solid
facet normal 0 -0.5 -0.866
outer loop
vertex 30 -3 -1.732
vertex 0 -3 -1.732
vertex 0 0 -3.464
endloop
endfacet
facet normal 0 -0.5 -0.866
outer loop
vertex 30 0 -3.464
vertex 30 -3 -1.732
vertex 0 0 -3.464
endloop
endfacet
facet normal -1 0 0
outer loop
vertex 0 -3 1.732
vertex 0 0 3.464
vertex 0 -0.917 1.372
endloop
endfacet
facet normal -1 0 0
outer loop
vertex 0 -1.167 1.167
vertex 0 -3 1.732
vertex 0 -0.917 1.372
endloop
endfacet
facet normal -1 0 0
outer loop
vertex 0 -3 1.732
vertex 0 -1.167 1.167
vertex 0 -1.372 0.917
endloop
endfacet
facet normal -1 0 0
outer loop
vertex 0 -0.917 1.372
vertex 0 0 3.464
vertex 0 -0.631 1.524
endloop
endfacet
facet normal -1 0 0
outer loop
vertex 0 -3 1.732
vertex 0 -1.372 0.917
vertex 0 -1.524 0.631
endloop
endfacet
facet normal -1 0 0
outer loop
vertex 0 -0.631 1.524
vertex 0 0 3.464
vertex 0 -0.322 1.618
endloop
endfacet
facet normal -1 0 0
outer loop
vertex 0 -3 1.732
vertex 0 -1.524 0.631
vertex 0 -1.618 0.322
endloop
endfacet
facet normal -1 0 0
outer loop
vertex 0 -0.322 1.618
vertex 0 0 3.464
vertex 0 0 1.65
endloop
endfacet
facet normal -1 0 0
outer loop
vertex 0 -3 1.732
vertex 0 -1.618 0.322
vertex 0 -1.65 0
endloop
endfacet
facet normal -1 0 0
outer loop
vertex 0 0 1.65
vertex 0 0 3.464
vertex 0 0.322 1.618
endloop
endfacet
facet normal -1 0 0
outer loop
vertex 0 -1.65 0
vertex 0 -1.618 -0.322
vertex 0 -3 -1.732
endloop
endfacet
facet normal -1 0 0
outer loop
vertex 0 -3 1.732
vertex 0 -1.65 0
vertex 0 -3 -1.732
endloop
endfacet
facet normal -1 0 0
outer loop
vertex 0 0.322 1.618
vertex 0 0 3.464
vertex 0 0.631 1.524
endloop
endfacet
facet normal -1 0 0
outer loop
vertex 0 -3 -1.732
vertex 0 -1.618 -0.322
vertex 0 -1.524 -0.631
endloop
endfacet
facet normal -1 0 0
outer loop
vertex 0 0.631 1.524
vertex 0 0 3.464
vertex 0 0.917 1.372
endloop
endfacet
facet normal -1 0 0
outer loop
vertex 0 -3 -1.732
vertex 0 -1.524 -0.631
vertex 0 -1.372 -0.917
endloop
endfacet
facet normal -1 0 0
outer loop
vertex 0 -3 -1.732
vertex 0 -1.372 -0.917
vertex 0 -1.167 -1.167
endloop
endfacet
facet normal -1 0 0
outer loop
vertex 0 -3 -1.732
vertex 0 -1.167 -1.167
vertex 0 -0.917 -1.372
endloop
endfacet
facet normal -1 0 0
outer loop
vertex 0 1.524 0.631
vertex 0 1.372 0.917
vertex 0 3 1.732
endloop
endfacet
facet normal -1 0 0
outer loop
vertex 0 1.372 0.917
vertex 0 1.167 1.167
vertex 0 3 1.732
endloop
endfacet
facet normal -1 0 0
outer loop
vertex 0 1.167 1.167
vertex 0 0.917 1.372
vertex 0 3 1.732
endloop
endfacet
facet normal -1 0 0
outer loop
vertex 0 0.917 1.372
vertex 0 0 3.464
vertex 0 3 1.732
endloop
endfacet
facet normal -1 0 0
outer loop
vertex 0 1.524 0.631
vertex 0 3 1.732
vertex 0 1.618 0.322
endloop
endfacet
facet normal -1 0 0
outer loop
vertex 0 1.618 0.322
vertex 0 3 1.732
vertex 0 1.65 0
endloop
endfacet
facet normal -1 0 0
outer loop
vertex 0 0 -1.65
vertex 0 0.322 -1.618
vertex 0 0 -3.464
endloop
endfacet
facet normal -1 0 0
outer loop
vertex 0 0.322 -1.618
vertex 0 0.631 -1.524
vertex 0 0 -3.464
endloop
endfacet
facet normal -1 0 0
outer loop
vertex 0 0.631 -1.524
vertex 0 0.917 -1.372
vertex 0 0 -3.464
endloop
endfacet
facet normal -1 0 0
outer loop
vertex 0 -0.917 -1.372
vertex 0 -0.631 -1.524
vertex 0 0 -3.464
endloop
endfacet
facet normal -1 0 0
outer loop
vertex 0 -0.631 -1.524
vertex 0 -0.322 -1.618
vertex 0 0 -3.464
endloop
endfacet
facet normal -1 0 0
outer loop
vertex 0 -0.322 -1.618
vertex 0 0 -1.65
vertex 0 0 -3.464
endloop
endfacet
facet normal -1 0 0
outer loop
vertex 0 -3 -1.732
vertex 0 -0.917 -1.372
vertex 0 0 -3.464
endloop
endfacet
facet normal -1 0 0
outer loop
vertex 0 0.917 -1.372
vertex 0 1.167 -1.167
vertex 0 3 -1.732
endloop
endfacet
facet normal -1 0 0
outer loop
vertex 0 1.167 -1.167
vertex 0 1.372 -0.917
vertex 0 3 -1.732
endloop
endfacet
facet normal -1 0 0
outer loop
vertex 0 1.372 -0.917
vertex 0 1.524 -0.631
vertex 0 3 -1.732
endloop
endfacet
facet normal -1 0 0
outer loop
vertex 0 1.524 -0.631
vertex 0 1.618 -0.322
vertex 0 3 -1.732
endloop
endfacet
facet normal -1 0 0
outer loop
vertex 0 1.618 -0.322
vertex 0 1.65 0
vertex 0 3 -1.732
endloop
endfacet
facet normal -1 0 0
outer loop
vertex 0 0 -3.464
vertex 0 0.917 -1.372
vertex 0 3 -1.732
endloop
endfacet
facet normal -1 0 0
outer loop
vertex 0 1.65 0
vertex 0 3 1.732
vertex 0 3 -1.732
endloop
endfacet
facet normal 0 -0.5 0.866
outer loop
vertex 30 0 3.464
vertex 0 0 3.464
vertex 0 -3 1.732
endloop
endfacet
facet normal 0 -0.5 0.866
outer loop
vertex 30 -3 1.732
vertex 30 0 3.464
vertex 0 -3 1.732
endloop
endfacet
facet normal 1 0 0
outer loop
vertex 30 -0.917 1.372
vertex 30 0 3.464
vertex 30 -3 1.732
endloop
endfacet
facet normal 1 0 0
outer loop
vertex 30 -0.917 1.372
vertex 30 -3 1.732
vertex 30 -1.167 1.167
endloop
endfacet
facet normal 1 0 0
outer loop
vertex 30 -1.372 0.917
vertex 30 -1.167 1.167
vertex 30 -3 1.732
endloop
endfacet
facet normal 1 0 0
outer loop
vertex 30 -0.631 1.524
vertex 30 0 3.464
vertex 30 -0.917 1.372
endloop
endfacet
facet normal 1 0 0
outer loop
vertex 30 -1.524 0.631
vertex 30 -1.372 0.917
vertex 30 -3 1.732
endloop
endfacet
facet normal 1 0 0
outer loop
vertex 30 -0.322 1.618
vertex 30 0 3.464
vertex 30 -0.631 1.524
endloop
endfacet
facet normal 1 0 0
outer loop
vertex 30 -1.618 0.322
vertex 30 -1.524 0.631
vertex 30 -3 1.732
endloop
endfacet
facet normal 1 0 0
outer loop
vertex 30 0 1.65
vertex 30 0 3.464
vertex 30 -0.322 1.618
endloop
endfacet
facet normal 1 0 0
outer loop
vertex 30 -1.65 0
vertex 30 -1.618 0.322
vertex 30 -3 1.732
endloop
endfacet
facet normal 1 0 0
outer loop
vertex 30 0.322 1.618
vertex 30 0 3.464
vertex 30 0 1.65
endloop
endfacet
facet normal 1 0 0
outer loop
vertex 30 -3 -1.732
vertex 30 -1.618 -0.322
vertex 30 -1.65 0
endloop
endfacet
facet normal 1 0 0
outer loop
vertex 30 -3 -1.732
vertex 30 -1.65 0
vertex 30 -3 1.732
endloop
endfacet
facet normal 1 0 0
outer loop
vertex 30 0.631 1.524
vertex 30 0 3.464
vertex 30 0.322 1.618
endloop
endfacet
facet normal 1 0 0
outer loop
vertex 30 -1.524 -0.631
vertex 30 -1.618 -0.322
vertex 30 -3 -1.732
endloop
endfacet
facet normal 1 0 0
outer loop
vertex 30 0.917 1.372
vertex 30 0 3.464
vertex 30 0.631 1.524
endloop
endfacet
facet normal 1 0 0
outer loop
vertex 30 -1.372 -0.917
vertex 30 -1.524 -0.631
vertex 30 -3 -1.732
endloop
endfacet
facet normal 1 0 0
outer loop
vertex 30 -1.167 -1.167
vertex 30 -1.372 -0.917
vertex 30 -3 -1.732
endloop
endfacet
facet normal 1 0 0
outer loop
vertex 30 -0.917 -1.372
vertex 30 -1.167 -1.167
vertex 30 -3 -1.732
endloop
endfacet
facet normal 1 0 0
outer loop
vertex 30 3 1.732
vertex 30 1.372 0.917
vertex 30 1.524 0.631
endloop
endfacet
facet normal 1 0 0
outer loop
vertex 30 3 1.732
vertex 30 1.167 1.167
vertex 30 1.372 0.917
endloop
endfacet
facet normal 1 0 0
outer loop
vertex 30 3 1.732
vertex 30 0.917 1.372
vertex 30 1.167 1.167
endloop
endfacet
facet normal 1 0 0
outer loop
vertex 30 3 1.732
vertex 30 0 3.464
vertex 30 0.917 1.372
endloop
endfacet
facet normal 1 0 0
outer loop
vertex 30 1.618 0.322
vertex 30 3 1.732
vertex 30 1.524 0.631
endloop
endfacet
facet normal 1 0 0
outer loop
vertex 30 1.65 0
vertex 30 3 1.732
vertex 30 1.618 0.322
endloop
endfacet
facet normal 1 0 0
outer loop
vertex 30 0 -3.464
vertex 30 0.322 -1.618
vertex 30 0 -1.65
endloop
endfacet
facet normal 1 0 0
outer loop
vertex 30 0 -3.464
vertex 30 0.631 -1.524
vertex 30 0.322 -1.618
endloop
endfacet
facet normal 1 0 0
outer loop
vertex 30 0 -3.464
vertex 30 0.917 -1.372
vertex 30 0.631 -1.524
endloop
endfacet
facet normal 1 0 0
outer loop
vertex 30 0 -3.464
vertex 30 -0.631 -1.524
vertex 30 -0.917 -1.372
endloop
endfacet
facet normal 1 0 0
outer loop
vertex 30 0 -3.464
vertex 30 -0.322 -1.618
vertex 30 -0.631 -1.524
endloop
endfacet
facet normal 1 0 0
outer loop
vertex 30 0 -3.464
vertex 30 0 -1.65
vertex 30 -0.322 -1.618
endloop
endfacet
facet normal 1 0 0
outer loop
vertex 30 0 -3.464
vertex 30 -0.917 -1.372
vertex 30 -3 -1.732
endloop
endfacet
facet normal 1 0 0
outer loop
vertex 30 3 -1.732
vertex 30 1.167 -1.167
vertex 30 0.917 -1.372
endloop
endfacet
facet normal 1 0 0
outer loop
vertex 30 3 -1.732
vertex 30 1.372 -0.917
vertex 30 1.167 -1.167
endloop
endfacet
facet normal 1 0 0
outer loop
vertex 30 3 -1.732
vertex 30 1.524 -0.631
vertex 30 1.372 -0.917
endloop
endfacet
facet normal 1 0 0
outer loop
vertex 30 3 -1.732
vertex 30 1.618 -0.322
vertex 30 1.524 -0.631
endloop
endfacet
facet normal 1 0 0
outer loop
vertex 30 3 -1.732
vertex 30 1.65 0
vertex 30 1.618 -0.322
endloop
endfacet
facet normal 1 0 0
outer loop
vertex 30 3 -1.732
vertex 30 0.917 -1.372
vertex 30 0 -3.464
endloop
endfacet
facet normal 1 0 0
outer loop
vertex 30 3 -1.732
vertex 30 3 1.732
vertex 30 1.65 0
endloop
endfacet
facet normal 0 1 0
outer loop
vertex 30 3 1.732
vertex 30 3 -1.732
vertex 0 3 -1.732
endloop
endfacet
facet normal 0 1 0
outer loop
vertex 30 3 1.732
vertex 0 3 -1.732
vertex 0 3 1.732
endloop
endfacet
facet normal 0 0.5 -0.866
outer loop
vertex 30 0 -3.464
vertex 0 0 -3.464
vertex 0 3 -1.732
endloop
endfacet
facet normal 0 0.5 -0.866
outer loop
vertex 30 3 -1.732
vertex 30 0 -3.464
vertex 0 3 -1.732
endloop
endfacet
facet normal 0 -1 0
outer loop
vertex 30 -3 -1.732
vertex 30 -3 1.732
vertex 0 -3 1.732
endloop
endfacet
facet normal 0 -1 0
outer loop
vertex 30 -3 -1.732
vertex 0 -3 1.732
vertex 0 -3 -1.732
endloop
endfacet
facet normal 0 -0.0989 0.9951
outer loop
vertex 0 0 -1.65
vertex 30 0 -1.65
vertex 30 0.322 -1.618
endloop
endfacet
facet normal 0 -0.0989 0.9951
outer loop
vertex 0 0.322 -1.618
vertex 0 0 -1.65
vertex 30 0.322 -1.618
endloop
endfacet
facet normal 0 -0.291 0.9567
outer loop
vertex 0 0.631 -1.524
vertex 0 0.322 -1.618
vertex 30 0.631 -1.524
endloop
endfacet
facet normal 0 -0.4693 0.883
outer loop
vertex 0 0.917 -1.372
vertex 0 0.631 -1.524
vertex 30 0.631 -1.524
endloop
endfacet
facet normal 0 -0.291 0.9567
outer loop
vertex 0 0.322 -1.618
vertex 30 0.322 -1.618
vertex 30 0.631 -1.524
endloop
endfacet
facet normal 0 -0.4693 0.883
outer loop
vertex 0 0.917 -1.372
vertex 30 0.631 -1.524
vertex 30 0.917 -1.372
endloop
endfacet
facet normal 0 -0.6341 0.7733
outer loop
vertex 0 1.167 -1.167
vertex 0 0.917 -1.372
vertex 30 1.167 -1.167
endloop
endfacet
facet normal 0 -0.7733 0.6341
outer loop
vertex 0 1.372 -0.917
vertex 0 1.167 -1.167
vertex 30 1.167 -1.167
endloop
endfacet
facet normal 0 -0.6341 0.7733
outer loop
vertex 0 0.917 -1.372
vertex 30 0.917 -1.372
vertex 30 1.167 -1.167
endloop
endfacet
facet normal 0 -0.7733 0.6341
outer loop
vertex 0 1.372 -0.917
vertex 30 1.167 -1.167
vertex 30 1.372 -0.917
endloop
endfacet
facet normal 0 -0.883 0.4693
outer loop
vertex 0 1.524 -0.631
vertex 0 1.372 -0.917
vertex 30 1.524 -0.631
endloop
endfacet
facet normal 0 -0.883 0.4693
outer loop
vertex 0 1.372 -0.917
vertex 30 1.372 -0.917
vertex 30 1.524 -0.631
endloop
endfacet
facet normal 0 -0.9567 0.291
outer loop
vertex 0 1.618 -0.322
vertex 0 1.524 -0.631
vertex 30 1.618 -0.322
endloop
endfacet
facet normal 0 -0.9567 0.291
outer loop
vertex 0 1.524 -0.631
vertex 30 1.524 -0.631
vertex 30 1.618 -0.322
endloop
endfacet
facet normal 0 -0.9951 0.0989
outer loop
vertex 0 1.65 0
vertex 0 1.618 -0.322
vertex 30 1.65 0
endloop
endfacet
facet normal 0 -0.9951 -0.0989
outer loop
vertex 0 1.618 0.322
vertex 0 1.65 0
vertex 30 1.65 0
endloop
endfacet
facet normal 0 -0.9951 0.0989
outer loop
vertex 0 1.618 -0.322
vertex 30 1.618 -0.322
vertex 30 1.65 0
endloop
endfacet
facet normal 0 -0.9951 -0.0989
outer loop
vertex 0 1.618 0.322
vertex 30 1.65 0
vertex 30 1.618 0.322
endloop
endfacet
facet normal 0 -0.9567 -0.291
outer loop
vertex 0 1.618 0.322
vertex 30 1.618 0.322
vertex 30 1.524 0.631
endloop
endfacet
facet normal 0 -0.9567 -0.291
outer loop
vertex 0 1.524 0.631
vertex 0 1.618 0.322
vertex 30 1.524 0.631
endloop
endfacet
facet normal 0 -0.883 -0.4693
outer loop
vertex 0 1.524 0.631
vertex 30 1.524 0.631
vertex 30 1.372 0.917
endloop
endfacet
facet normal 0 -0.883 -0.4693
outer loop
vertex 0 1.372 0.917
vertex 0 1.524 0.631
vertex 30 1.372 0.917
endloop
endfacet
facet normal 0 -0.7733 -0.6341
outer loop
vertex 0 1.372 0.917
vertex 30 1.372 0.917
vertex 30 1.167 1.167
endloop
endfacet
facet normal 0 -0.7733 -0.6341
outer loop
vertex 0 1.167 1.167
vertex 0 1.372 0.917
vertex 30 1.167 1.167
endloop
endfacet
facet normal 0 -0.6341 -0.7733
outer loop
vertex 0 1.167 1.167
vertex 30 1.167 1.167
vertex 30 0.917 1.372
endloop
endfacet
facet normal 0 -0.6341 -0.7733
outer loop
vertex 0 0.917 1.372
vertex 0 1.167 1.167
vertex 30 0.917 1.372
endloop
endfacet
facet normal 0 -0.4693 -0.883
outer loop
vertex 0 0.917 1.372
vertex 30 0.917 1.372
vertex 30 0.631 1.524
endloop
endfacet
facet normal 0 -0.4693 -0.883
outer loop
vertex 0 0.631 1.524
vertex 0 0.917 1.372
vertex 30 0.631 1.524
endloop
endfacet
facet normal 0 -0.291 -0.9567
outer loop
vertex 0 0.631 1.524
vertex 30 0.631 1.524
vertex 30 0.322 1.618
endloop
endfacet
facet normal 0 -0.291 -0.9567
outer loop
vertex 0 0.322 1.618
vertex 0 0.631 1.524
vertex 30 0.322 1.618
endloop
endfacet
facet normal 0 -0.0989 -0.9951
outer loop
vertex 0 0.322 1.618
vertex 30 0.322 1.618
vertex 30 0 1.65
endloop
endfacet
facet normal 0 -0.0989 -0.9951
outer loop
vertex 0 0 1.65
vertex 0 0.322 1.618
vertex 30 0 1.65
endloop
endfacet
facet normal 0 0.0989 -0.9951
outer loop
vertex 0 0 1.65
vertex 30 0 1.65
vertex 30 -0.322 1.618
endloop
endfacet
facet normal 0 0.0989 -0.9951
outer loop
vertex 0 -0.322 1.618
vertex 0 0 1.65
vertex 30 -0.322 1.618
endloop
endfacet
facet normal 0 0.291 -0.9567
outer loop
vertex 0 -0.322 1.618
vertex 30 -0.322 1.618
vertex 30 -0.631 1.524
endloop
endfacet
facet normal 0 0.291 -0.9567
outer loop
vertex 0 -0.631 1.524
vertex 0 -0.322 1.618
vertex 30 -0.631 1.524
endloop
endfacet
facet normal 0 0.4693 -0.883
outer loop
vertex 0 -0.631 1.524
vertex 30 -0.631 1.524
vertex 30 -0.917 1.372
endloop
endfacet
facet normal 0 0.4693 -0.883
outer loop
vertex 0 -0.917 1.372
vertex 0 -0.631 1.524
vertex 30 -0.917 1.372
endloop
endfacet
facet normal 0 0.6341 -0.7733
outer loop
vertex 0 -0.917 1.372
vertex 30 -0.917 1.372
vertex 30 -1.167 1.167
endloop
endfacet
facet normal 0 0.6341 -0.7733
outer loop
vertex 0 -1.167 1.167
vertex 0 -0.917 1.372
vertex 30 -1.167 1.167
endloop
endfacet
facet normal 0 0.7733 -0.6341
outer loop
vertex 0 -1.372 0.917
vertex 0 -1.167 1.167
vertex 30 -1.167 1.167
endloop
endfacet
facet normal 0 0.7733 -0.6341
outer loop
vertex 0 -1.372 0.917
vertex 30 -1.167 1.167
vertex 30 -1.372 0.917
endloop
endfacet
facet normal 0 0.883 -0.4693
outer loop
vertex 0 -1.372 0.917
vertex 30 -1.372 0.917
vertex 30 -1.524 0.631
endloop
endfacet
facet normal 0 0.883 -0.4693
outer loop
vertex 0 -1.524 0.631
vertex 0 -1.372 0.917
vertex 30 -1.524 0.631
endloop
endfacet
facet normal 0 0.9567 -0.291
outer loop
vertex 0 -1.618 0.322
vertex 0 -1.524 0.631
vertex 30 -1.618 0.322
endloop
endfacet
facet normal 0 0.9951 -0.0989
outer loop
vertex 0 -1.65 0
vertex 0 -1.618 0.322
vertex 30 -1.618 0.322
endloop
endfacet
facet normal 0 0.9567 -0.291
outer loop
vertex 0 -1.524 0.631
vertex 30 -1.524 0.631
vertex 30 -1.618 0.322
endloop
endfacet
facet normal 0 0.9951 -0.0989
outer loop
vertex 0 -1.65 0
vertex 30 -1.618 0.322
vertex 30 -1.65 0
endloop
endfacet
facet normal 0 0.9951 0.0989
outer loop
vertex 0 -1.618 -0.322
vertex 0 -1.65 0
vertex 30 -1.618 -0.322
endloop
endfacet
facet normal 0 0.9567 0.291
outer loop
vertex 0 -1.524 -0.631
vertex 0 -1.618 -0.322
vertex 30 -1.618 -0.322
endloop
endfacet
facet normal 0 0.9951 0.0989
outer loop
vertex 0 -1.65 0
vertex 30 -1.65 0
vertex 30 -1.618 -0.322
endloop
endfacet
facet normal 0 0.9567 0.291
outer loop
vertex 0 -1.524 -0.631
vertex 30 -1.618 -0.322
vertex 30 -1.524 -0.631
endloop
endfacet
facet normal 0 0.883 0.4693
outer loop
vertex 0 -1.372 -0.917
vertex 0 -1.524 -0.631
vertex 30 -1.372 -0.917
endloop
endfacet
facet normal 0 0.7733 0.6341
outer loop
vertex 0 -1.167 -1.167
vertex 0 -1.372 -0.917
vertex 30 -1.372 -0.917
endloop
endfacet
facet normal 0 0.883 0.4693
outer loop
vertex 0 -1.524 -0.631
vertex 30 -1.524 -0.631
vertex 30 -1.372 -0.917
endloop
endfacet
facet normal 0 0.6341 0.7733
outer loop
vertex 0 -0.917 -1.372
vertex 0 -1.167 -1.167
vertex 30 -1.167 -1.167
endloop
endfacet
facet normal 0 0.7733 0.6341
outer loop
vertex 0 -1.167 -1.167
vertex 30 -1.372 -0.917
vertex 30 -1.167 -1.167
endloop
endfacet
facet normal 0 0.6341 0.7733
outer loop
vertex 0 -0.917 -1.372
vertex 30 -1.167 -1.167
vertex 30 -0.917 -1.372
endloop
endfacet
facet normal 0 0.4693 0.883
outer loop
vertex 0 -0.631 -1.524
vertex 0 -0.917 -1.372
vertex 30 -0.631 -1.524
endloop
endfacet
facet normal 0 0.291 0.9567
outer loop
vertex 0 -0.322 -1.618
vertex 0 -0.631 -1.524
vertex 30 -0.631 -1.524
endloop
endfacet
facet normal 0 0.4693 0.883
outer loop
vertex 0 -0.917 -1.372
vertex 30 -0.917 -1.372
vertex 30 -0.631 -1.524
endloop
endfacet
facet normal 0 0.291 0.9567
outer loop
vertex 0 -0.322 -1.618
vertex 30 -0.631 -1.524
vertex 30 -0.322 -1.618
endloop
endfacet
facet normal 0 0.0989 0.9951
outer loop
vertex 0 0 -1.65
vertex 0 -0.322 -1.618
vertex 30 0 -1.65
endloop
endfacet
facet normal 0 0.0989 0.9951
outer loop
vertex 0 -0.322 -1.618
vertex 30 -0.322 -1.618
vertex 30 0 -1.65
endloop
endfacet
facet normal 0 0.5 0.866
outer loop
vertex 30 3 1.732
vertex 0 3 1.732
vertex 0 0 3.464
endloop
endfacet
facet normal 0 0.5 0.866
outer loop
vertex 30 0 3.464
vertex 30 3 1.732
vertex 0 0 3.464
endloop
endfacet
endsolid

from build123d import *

# Parameters (mm, degrees)
EXTRUDE_1_DEPTH    = 30
HOLE_WIZARD_M4_1_D = 3.3


with BuildPart() as part:
    # 草图1 → 凸台-拉伸1 (new body)
    with BuildSketch(Plane(origin=(0, 0, 0), x_dir=(0, 0, -1), z_dir=(1, 0, 0))):
        Polygon((3.464101615, 0), (1.732050808, 3), (-1.732050808, 3), (-3.464101615, 0), (-1.732050808, -3), (1.732050808, -3), align=None)
    extrude(amount=EXTRUDE_1_DEPTH)

    # M4 螺纹孔1 (through all)
    with Locations(Plane.ZY):
        with Locations((0, 0)):
            Hole(HOLE_WIZARD_M4_1_D / 2)


solid = part.part
